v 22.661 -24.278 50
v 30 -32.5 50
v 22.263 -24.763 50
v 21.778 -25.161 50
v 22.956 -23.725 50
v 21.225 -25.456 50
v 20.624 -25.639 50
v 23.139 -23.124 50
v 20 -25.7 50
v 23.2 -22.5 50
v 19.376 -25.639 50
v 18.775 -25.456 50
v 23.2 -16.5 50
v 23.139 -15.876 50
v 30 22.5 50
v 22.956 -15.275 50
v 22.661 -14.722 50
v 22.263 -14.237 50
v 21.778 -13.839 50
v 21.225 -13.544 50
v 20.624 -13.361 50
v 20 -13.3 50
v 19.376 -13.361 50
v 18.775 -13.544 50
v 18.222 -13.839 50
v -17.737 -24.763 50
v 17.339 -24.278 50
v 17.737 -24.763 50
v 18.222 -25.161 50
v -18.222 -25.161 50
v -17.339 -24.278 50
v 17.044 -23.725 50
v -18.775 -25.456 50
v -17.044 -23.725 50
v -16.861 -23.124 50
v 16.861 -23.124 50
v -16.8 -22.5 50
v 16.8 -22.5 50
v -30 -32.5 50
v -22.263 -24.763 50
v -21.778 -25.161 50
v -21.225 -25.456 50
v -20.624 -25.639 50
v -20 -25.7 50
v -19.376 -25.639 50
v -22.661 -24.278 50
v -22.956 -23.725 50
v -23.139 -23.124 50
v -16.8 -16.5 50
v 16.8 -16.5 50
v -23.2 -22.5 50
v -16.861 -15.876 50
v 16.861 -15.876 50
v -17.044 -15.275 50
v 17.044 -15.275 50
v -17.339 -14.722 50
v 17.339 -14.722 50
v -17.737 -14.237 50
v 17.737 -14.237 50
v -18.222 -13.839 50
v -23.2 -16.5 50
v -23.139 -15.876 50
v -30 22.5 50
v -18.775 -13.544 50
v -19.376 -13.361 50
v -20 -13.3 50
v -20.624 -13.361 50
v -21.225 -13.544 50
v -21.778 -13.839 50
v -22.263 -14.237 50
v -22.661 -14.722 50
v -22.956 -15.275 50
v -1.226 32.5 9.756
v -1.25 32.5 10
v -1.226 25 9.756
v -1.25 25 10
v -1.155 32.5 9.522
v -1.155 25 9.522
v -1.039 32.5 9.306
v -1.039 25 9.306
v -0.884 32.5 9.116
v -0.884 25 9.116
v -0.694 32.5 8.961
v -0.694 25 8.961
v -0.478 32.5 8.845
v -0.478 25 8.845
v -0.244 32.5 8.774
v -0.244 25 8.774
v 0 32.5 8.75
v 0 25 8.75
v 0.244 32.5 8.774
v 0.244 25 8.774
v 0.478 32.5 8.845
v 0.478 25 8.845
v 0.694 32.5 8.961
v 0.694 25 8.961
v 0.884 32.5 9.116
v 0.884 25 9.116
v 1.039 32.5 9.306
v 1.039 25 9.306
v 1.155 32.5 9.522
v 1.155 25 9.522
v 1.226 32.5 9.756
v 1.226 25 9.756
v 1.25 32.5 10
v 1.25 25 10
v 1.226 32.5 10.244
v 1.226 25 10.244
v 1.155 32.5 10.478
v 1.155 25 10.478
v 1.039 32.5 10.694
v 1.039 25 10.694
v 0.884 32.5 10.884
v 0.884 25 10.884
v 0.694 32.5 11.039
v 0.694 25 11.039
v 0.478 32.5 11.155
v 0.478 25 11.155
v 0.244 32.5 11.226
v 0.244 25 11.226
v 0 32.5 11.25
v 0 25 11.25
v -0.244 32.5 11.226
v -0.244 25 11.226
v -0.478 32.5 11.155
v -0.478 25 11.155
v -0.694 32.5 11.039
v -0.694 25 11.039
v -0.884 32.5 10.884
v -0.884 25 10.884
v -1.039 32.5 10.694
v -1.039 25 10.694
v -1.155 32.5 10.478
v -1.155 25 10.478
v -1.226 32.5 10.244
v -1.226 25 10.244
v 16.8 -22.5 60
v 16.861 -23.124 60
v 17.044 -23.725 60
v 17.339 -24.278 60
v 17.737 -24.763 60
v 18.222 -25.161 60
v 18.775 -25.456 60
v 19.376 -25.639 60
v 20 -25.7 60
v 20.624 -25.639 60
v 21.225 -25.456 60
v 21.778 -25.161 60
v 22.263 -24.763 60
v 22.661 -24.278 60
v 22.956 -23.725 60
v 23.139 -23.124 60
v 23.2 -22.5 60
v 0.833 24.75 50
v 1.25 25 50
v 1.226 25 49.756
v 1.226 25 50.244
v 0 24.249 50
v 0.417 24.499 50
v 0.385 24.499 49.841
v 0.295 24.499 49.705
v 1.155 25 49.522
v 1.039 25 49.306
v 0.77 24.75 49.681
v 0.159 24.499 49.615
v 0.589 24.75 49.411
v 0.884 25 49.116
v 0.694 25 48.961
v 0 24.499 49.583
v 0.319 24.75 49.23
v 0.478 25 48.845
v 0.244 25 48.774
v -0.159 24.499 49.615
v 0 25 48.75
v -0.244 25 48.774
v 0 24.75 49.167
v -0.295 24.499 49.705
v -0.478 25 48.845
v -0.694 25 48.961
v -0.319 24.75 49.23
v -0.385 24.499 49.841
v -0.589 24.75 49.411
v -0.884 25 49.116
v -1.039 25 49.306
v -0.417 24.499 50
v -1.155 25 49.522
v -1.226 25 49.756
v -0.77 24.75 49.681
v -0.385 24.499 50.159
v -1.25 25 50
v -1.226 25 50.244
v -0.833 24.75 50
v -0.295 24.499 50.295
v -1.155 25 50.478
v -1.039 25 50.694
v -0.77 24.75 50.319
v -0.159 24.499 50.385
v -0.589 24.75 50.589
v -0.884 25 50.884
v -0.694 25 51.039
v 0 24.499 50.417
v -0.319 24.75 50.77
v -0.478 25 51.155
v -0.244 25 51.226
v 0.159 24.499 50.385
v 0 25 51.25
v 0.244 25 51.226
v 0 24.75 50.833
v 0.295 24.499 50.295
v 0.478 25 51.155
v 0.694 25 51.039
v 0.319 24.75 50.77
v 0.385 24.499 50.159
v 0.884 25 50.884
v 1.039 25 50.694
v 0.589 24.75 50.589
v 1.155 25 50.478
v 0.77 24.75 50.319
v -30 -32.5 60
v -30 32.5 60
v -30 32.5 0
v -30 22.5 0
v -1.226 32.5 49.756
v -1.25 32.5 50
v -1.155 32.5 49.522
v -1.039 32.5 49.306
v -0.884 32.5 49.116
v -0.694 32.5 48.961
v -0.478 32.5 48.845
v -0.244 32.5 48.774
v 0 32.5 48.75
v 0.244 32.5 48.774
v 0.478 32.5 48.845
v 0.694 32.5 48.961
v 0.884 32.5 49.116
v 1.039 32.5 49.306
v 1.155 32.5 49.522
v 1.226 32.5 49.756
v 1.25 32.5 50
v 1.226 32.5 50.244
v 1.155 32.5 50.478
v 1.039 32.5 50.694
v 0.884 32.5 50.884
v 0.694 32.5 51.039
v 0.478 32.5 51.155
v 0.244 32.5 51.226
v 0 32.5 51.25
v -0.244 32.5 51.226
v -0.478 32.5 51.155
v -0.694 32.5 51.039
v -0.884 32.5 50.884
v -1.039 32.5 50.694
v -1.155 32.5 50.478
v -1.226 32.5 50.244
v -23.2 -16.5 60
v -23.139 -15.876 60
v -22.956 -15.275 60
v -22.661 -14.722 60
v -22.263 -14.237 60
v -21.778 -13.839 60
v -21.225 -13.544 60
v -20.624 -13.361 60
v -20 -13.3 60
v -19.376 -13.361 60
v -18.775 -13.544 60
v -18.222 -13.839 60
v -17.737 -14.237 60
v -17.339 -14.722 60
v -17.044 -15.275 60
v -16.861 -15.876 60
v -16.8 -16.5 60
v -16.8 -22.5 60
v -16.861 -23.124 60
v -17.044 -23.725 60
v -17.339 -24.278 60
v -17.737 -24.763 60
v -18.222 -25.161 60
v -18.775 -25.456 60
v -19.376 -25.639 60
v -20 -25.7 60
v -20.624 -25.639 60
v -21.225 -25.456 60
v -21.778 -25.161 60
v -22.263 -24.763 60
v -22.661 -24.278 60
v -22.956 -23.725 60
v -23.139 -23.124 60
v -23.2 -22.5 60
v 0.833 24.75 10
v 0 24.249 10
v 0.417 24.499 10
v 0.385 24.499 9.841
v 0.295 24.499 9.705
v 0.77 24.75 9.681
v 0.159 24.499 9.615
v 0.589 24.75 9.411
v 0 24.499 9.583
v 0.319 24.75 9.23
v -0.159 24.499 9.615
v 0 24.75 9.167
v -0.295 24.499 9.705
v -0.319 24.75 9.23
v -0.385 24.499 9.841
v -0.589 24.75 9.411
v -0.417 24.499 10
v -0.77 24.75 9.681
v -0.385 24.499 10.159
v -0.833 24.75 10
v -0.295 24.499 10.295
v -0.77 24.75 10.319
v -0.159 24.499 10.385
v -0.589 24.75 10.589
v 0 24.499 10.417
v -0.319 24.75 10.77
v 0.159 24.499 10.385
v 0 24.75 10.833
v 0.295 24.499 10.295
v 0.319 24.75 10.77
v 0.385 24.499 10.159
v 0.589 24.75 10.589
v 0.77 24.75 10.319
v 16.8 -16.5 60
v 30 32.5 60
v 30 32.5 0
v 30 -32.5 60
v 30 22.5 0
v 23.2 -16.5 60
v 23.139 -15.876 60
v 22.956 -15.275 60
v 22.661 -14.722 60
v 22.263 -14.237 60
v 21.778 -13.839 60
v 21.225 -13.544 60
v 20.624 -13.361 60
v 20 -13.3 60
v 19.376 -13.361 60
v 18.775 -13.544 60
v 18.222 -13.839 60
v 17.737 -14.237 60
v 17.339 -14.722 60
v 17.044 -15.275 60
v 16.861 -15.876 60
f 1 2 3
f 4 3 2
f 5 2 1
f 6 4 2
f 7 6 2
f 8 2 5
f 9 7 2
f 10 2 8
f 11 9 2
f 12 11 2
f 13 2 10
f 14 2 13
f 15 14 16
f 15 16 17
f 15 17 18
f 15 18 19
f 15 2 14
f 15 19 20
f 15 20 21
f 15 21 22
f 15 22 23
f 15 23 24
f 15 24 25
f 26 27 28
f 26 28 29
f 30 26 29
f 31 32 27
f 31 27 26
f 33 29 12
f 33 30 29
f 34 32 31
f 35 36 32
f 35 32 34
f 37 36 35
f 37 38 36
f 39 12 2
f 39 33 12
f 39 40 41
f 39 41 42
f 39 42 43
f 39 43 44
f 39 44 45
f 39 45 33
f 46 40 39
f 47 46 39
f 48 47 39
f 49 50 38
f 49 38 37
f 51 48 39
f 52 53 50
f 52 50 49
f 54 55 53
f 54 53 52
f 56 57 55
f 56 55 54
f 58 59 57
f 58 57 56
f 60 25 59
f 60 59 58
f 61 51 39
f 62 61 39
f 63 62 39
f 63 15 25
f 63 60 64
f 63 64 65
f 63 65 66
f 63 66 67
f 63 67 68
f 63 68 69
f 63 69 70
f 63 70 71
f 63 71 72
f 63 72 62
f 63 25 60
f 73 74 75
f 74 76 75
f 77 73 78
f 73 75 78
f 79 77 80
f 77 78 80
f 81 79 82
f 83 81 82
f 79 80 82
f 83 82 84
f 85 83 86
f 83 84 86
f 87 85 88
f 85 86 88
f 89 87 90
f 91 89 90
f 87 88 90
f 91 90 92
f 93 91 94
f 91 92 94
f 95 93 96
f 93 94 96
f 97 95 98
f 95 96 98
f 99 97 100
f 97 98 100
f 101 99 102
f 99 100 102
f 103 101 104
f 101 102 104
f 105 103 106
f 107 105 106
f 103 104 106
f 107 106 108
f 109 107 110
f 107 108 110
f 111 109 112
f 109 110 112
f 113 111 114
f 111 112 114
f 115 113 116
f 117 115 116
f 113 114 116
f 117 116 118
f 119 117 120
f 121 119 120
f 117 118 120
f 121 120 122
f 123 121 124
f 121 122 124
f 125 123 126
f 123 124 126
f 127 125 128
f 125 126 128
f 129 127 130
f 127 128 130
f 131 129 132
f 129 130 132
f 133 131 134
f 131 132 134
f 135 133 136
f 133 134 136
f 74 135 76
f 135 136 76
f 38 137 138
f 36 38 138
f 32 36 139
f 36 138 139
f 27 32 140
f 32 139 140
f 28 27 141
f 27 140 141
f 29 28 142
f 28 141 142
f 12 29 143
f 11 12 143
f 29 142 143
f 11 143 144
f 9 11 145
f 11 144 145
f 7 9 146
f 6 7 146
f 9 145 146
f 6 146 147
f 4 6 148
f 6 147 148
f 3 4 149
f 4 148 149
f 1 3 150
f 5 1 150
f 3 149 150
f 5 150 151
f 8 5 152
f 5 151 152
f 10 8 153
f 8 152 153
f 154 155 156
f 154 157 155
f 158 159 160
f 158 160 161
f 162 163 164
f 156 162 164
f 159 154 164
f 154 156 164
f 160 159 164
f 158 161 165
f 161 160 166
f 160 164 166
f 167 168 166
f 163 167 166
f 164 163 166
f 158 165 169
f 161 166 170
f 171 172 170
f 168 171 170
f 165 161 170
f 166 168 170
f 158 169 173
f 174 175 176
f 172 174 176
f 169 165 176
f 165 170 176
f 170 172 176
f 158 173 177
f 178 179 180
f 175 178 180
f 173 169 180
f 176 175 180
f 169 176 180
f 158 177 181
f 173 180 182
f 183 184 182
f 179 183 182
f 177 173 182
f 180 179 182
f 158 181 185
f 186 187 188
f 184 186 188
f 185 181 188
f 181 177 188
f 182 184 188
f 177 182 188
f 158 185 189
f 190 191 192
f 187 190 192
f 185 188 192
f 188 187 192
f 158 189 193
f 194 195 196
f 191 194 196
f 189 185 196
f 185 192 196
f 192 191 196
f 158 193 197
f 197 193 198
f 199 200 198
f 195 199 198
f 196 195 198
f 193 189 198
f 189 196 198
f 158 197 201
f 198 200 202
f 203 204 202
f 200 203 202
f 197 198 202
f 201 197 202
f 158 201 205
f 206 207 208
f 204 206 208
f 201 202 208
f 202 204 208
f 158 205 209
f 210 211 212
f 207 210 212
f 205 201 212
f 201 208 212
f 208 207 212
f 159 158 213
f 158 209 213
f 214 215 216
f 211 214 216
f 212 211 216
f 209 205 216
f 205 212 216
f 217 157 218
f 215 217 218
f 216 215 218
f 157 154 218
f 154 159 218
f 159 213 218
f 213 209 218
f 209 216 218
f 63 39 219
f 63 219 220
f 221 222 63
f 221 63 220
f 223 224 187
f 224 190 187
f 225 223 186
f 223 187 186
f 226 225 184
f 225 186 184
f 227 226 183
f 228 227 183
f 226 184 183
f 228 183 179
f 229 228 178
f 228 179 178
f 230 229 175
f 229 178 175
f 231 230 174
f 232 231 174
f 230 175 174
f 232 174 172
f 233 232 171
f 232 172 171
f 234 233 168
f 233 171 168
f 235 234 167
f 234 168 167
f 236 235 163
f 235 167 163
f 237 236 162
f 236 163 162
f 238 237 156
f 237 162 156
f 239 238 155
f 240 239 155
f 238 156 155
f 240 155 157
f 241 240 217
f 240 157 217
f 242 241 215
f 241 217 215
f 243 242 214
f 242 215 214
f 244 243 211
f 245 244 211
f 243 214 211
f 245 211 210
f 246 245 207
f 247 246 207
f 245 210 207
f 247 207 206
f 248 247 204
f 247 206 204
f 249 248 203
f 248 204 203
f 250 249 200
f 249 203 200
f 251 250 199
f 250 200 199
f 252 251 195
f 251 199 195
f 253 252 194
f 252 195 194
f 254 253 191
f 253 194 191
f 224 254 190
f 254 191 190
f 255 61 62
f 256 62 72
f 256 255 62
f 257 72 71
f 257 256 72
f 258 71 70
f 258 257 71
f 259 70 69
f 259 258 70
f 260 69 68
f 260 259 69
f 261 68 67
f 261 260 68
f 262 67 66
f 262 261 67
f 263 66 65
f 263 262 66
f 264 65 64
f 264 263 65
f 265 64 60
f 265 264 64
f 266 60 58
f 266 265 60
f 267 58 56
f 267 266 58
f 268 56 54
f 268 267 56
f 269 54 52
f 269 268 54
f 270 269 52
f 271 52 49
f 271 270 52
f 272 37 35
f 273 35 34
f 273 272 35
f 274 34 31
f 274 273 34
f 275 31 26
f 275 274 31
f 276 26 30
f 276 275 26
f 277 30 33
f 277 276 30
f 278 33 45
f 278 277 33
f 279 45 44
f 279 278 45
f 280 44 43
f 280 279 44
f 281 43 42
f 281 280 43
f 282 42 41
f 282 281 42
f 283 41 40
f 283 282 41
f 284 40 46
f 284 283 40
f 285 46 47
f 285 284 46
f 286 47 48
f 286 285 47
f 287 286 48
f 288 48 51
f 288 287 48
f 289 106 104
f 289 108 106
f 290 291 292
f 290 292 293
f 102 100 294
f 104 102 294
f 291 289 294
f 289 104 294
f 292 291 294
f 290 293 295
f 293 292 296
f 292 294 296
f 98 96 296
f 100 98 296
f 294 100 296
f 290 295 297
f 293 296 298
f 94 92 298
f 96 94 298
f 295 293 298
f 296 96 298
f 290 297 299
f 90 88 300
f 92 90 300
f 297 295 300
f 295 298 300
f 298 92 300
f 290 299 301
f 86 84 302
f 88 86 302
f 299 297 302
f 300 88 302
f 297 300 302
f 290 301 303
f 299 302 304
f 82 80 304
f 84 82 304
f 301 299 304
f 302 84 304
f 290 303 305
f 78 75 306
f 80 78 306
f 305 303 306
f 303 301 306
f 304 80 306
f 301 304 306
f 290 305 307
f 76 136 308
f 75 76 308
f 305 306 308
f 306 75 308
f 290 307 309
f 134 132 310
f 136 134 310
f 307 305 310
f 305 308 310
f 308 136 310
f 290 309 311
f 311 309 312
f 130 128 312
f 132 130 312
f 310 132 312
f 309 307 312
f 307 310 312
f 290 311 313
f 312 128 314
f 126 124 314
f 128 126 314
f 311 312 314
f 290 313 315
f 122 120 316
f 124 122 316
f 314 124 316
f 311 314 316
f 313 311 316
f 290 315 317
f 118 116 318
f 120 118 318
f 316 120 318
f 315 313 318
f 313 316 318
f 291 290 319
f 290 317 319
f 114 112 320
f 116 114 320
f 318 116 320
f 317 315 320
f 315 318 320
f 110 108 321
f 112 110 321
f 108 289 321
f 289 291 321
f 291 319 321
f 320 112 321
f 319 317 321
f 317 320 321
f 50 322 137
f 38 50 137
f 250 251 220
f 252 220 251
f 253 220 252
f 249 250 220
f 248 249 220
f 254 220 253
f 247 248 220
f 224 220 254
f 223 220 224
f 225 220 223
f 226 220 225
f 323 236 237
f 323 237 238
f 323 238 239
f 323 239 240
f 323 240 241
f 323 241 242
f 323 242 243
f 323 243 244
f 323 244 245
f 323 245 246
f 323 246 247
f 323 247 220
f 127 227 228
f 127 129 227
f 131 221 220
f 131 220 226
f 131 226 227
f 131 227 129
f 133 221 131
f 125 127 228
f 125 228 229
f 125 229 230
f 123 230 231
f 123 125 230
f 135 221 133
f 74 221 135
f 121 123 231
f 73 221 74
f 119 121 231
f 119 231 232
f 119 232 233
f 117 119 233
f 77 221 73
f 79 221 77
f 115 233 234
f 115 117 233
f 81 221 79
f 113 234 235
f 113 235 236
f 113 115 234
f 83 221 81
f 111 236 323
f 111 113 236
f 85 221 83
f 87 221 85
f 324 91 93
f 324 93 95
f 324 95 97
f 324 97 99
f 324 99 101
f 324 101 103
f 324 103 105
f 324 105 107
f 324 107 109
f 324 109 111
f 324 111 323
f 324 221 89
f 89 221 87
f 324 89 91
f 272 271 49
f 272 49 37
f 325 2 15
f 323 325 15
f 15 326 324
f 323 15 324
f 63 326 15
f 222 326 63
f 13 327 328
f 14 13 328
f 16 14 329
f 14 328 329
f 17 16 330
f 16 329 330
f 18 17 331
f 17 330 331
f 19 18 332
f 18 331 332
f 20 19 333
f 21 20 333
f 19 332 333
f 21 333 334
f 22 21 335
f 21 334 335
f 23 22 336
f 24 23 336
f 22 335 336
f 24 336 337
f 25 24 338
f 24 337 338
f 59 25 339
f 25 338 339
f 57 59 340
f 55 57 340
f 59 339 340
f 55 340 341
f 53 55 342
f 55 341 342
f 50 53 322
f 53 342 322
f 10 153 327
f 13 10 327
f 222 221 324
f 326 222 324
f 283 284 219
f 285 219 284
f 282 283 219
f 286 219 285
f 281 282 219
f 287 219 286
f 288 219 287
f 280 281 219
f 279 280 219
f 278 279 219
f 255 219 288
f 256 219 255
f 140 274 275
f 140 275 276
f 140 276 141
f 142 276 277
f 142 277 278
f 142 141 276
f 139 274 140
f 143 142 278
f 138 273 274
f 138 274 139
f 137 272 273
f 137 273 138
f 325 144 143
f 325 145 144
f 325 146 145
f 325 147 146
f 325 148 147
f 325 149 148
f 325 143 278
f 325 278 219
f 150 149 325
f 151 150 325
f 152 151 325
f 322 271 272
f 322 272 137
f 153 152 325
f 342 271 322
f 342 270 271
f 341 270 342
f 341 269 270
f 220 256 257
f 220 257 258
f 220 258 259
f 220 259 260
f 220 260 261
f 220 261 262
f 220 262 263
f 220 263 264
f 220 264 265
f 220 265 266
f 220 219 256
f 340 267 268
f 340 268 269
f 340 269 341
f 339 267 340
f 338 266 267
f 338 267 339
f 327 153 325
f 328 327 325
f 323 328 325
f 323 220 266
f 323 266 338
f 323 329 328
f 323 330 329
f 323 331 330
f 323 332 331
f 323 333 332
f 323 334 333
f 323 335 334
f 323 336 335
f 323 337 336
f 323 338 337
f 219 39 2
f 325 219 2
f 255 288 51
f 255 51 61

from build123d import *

# Parameters (mm, degrees)
SKETCH_1_W             = 60
SKETCH_1_H             = 65
EXTRUDE_1_DEPTH        = 60
SKETCH_2_W             = 60
SKETCH_2_H             = 55
CUT_EXTRUDE_1_DEPTH    = 50
CUT_EXTRUDE_2_DEPTH    = 61
HOLE_WIZARD_M3_1_D     = 2.5
HOLE_WIZARD_M3_1_DEPTH = 7.5
HOLE_WIZARD_M3_1_TIP   = 0.751075774


with BuildPart() as part:
    # 草图1 → 凸台-拉伸1 (new body)
    with BuildSketch(Plane.XY):
        Rectangle(SKETCH_1_W, SKETCH_1_H)
    extrude(amount=EXTRUDE_1_DEPTH)

    # 草图2 → 切除-拉伸1 (cut)
    with BuildSketch(Plane(origin=(0, 0, 0), x_dir=(-1, 0, 0), z_dir=(0, 0, -1))):
        with Locations((0, -5)):
            Rectangle(SKETCH_2_W, SKETCH_2_H)
    extrude(amount=-CUT_EXTRUDE_1_DEPTH, mode=Mode.SUBTRACT)

    # 草图3 → 切除-拉伸2 (cut, through all)
    with BuildSketch(Plane.XY.offset(60)):
        with BuildLine():
            Line((-23.2, -22.5), (-23.2, -16.5))
            ThreePointArc((-23.2, -16.5), (-20, -13.3), (-16.8, -16.5))
            Line((-16.8, -16.5), (-16.8, -22.5))
            ThreePointArc((-16.8, -22.5), (-20, -25.7), (-23.2, -22.5))
        make_face()
        with BuildLine():
            Line((23.2, -22.5), (23.2, -16.5))
            ThreePointArc((23.2, -16.5), (20, -13.3), (16.8, -16.5))
            Line((16.8, -16.5), (16.8, -22.5))
            ThreePointArc((16.8, -22.5), (20, -25.7), (23.2, -22.5))
        make_face()
    extrude(amount=-CUT_EXTRUDE_2_DEPTH, mode=Mode.SUBTRACT)

    # M3 螺纹孔1
    with Locations(Plane(origin=(0, 32.5, 10), x_dir=(1, 0, 0), z_dir=(0, 1, 0))):
        with Locations((0, 0), (0, -40)):
            Hole(HOLE_WIZARD_M3_1_D / 2, depth=HOLE_WIZARD_M3_1_DEPTH)
            with Locations((0, 0, -(HOLE_WIZARD_M3_1_DEPTH + HOLE_WIZARD_M3_1_TIP / 2))):  # 118° drill point
                Cone(0, HOLE_WIZARD_M3_1_D / 2, HOLE_WIZARD_M3_1_TIP, mode=Mode.SUBTRACT)


solid = part.part
